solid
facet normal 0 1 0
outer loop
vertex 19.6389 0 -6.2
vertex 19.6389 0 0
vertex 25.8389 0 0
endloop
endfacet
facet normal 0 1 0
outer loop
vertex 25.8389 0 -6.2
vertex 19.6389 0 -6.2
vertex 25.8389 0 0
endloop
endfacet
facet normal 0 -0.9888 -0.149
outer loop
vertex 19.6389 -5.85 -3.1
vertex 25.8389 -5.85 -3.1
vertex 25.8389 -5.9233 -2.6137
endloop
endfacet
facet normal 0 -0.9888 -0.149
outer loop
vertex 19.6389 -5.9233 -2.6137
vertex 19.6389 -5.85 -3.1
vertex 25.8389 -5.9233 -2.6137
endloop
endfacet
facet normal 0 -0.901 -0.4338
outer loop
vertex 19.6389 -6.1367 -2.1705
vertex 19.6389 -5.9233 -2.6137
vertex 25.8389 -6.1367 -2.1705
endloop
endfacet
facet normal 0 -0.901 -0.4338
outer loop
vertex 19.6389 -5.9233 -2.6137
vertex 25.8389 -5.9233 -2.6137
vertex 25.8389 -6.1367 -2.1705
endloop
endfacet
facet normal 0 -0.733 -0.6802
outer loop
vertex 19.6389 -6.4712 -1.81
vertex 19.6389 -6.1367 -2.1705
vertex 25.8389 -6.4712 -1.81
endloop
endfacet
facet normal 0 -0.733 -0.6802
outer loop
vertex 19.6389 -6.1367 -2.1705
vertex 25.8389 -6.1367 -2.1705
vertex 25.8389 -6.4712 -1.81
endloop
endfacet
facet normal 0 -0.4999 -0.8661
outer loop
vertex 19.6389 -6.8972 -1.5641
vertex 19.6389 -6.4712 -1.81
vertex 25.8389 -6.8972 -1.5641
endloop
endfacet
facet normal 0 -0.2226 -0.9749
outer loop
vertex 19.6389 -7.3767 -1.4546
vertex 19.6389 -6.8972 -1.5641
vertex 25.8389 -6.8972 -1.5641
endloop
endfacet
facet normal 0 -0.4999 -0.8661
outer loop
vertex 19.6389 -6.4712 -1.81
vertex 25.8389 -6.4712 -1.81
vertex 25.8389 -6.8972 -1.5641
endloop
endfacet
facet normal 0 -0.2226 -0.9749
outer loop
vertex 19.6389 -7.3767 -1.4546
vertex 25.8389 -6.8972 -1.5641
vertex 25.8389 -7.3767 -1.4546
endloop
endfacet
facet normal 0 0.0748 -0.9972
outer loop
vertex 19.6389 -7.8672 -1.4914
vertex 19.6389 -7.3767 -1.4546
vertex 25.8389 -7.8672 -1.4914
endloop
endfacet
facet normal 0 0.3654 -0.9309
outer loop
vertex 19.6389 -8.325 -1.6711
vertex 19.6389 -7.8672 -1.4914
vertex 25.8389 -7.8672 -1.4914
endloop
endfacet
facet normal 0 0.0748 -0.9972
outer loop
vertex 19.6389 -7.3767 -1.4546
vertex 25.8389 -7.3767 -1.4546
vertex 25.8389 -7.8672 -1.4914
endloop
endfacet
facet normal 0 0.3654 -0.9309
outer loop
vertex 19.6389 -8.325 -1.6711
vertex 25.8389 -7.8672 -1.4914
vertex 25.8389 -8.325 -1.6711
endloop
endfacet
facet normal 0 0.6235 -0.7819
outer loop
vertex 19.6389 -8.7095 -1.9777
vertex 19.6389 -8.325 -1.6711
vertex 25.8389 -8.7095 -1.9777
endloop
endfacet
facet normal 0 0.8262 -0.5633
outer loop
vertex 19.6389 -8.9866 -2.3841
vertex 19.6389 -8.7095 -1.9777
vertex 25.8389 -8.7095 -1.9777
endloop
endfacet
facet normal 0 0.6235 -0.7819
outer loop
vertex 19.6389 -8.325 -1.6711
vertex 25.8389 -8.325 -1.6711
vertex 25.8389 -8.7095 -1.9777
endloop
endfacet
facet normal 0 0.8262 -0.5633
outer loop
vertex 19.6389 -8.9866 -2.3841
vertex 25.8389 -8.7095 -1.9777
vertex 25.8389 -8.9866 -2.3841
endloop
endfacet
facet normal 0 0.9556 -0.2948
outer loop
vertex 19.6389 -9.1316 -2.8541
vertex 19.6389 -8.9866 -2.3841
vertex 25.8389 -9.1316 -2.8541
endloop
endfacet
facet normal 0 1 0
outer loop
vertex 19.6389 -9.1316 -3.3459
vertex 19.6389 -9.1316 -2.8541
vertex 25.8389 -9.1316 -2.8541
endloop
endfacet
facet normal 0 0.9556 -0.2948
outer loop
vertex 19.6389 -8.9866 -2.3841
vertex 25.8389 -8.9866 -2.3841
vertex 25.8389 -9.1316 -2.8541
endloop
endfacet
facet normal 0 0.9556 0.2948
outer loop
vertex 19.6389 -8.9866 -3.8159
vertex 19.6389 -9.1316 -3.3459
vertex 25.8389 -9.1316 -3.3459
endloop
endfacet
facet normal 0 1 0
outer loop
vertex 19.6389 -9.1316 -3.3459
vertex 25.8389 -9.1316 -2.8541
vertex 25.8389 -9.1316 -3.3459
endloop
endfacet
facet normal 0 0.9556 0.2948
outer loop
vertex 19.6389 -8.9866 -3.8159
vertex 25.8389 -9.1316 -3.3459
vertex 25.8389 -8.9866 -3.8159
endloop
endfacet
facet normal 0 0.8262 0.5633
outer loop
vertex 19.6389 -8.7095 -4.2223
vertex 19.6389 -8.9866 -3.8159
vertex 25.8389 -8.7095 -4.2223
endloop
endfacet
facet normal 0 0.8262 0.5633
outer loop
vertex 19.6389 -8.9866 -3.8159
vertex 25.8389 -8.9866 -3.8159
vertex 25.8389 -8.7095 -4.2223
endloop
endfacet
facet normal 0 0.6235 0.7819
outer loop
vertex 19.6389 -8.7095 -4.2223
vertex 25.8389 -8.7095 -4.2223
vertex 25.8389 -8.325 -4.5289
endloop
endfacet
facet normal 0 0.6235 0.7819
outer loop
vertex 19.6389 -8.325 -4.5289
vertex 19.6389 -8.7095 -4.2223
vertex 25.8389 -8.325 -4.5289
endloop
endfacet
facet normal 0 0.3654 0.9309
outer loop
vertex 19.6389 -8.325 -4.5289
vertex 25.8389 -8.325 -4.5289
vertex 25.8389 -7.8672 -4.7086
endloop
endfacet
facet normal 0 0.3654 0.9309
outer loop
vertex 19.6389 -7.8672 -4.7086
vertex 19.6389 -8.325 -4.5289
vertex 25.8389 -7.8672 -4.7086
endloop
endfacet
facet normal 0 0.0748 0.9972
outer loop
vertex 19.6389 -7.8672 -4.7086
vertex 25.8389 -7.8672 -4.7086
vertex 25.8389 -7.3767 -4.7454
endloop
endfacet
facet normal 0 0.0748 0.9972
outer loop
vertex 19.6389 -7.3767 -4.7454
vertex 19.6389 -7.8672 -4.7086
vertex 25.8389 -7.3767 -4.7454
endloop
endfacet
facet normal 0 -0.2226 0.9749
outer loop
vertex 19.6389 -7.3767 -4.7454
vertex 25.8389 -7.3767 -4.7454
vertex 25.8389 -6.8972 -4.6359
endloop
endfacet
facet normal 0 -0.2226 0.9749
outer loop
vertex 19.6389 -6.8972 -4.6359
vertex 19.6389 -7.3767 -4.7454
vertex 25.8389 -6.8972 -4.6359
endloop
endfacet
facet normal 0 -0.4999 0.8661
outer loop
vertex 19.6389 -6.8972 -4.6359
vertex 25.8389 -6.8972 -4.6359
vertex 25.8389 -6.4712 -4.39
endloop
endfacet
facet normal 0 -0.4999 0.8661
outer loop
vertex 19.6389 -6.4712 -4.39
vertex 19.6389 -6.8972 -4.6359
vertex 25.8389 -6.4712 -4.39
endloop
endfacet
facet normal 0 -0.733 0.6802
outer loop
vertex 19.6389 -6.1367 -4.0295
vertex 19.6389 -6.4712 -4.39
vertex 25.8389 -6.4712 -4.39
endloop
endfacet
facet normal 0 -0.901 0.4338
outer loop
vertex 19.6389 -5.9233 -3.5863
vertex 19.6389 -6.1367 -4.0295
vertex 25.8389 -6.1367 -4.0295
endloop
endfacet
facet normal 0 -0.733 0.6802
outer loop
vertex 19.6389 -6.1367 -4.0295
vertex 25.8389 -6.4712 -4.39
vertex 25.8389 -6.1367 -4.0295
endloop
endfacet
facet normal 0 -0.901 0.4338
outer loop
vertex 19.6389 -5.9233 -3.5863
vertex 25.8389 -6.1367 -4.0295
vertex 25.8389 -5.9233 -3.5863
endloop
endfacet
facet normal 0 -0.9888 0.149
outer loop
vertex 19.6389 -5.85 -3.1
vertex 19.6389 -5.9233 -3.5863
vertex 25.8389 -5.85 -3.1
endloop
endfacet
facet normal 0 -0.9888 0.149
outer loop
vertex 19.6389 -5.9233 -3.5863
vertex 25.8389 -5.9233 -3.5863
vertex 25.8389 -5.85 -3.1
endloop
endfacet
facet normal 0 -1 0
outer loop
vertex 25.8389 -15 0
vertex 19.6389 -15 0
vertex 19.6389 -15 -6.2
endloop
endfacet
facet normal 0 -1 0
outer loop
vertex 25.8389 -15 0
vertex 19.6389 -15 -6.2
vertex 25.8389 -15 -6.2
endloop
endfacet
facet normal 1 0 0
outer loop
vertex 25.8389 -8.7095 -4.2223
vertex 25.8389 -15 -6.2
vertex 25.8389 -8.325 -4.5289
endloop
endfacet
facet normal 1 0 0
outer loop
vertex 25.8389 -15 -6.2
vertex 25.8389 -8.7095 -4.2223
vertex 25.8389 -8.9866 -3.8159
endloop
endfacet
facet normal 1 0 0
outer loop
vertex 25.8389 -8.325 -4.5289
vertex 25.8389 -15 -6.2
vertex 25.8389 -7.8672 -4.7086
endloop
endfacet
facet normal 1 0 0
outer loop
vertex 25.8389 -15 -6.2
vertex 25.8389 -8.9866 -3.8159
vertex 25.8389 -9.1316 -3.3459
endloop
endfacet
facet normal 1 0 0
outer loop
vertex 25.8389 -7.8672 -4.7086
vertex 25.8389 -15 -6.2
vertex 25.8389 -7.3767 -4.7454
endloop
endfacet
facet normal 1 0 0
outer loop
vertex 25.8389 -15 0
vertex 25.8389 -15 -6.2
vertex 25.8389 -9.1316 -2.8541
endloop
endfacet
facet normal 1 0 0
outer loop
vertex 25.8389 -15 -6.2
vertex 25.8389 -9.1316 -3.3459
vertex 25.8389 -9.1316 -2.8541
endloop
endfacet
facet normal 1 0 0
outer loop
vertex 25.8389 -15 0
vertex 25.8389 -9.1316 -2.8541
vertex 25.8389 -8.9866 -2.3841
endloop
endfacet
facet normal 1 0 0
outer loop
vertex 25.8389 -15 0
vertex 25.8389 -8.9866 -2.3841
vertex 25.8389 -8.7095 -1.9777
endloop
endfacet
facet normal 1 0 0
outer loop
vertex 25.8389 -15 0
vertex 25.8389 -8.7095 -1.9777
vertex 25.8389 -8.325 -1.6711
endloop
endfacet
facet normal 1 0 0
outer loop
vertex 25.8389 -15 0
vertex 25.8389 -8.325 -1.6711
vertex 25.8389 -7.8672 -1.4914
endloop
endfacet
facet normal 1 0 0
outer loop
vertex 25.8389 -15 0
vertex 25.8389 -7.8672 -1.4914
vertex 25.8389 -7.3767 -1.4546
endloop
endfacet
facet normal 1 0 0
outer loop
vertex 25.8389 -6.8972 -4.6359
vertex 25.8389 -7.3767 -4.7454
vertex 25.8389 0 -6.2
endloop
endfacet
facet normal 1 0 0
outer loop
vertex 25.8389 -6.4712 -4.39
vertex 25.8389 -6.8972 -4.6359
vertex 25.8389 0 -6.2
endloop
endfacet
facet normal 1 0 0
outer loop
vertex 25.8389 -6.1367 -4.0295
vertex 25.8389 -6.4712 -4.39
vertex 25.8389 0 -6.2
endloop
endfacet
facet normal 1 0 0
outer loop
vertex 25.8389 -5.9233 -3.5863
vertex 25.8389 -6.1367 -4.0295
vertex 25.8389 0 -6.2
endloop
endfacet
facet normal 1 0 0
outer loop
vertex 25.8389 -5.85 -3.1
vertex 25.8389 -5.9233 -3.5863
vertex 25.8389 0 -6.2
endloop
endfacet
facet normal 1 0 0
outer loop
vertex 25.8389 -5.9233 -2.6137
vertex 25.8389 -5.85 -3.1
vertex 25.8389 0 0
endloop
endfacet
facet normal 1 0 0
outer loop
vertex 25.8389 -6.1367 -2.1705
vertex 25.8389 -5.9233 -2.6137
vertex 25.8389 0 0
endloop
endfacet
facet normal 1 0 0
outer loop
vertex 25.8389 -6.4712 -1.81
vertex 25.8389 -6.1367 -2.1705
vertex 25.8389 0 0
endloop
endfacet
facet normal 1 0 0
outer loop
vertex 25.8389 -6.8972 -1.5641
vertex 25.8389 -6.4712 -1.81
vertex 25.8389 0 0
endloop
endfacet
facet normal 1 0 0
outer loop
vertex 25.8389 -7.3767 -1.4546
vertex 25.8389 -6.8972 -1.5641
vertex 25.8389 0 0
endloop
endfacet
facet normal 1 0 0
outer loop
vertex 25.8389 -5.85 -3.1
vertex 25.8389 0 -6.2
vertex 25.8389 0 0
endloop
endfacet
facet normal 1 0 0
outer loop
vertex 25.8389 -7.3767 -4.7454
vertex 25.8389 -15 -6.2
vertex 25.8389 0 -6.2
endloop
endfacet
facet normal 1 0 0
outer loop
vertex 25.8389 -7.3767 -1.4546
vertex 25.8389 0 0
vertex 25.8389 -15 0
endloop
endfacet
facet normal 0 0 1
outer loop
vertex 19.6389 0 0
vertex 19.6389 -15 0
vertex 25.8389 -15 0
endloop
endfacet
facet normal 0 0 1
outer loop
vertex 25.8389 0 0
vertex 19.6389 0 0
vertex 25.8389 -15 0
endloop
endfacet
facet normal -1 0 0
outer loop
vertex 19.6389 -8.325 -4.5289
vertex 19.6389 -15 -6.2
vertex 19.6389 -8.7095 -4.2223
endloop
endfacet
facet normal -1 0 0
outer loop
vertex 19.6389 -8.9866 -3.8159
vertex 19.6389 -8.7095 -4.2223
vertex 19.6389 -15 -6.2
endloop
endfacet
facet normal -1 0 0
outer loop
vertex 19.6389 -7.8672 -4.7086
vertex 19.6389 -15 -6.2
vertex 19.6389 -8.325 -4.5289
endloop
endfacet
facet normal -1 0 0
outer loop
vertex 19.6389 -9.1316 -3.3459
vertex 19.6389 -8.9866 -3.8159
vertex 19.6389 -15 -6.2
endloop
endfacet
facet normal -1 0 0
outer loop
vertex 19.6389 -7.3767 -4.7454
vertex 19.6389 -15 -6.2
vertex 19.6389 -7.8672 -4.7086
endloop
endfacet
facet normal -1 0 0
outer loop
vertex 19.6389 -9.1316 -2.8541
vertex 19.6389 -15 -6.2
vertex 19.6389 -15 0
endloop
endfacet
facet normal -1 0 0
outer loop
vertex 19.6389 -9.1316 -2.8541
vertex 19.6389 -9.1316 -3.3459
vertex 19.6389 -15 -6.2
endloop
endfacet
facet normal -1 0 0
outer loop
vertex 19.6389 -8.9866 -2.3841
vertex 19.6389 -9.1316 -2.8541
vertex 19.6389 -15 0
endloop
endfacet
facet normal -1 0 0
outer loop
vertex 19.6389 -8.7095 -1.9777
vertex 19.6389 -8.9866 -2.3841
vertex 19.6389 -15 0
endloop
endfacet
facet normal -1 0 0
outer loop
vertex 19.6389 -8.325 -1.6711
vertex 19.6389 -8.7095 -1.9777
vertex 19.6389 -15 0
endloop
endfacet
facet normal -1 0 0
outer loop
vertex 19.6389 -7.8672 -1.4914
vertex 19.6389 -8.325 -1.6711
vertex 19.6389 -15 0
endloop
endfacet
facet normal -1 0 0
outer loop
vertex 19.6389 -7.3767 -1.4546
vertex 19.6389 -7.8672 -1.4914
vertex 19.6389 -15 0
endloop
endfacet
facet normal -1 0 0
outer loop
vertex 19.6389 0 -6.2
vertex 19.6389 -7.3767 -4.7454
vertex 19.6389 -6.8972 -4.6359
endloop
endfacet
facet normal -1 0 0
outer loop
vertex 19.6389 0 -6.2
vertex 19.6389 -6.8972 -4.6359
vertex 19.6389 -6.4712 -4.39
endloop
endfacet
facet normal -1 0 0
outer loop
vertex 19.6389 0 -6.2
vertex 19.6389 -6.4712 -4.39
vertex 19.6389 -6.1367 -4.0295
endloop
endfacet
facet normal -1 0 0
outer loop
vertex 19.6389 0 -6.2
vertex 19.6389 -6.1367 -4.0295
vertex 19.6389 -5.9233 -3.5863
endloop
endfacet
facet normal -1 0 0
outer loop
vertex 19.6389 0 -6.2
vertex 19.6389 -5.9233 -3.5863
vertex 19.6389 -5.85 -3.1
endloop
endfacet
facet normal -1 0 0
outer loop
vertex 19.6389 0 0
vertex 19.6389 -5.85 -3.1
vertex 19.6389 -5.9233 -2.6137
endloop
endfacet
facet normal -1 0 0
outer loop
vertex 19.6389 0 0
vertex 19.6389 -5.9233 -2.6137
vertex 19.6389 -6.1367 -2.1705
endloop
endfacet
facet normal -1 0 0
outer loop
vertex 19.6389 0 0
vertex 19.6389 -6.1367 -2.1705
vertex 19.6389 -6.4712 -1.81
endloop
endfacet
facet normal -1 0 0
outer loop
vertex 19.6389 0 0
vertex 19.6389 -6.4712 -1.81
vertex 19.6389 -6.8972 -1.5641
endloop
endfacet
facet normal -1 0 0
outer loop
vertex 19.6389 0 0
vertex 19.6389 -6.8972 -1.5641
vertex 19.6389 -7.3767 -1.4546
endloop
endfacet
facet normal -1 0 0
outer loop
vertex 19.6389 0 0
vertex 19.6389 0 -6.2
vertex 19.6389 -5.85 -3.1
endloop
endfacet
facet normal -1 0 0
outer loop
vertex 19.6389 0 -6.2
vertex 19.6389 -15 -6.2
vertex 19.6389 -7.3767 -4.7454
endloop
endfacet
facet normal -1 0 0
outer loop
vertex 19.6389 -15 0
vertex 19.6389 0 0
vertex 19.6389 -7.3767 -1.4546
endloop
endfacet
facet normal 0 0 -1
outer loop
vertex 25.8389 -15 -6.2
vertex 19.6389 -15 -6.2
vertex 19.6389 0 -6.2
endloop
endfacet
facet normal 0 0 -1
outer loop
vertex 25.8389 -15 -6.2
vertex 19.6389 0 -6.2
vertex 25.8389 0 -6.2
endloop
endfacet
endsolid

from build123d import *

# Parameters (mm, degrees)
F0_W     = 6.2
F0_H     = 6.2
F1_DEPTH = 15
F2_R     = 1.65
F3_DEPTH = 6.2


# Not quite as in the source:
# - a feature names something its author has since deleted; it is built from what else it names


with BuildPart() as f1:
    # F0 (on Front) → F1 (new body)
    with BuildSketch(Plane.XZ):
        with Locations((22.738877362, -3.1)):
            Rectangle(F0_W, F0_H)
    extrude(amount=F1_DEPTH)

    # F2 (on face) → F3 (cut, through all)
    with BuildSketch(Plane.YZ.offset(25.838877362)):
        with Locations((-7.5, -3.1)):
            Circle(F2_R)
    extrude(amount=-F3_DEPTH, mode=Mode.SUBTRACT)


solid = f1.part
